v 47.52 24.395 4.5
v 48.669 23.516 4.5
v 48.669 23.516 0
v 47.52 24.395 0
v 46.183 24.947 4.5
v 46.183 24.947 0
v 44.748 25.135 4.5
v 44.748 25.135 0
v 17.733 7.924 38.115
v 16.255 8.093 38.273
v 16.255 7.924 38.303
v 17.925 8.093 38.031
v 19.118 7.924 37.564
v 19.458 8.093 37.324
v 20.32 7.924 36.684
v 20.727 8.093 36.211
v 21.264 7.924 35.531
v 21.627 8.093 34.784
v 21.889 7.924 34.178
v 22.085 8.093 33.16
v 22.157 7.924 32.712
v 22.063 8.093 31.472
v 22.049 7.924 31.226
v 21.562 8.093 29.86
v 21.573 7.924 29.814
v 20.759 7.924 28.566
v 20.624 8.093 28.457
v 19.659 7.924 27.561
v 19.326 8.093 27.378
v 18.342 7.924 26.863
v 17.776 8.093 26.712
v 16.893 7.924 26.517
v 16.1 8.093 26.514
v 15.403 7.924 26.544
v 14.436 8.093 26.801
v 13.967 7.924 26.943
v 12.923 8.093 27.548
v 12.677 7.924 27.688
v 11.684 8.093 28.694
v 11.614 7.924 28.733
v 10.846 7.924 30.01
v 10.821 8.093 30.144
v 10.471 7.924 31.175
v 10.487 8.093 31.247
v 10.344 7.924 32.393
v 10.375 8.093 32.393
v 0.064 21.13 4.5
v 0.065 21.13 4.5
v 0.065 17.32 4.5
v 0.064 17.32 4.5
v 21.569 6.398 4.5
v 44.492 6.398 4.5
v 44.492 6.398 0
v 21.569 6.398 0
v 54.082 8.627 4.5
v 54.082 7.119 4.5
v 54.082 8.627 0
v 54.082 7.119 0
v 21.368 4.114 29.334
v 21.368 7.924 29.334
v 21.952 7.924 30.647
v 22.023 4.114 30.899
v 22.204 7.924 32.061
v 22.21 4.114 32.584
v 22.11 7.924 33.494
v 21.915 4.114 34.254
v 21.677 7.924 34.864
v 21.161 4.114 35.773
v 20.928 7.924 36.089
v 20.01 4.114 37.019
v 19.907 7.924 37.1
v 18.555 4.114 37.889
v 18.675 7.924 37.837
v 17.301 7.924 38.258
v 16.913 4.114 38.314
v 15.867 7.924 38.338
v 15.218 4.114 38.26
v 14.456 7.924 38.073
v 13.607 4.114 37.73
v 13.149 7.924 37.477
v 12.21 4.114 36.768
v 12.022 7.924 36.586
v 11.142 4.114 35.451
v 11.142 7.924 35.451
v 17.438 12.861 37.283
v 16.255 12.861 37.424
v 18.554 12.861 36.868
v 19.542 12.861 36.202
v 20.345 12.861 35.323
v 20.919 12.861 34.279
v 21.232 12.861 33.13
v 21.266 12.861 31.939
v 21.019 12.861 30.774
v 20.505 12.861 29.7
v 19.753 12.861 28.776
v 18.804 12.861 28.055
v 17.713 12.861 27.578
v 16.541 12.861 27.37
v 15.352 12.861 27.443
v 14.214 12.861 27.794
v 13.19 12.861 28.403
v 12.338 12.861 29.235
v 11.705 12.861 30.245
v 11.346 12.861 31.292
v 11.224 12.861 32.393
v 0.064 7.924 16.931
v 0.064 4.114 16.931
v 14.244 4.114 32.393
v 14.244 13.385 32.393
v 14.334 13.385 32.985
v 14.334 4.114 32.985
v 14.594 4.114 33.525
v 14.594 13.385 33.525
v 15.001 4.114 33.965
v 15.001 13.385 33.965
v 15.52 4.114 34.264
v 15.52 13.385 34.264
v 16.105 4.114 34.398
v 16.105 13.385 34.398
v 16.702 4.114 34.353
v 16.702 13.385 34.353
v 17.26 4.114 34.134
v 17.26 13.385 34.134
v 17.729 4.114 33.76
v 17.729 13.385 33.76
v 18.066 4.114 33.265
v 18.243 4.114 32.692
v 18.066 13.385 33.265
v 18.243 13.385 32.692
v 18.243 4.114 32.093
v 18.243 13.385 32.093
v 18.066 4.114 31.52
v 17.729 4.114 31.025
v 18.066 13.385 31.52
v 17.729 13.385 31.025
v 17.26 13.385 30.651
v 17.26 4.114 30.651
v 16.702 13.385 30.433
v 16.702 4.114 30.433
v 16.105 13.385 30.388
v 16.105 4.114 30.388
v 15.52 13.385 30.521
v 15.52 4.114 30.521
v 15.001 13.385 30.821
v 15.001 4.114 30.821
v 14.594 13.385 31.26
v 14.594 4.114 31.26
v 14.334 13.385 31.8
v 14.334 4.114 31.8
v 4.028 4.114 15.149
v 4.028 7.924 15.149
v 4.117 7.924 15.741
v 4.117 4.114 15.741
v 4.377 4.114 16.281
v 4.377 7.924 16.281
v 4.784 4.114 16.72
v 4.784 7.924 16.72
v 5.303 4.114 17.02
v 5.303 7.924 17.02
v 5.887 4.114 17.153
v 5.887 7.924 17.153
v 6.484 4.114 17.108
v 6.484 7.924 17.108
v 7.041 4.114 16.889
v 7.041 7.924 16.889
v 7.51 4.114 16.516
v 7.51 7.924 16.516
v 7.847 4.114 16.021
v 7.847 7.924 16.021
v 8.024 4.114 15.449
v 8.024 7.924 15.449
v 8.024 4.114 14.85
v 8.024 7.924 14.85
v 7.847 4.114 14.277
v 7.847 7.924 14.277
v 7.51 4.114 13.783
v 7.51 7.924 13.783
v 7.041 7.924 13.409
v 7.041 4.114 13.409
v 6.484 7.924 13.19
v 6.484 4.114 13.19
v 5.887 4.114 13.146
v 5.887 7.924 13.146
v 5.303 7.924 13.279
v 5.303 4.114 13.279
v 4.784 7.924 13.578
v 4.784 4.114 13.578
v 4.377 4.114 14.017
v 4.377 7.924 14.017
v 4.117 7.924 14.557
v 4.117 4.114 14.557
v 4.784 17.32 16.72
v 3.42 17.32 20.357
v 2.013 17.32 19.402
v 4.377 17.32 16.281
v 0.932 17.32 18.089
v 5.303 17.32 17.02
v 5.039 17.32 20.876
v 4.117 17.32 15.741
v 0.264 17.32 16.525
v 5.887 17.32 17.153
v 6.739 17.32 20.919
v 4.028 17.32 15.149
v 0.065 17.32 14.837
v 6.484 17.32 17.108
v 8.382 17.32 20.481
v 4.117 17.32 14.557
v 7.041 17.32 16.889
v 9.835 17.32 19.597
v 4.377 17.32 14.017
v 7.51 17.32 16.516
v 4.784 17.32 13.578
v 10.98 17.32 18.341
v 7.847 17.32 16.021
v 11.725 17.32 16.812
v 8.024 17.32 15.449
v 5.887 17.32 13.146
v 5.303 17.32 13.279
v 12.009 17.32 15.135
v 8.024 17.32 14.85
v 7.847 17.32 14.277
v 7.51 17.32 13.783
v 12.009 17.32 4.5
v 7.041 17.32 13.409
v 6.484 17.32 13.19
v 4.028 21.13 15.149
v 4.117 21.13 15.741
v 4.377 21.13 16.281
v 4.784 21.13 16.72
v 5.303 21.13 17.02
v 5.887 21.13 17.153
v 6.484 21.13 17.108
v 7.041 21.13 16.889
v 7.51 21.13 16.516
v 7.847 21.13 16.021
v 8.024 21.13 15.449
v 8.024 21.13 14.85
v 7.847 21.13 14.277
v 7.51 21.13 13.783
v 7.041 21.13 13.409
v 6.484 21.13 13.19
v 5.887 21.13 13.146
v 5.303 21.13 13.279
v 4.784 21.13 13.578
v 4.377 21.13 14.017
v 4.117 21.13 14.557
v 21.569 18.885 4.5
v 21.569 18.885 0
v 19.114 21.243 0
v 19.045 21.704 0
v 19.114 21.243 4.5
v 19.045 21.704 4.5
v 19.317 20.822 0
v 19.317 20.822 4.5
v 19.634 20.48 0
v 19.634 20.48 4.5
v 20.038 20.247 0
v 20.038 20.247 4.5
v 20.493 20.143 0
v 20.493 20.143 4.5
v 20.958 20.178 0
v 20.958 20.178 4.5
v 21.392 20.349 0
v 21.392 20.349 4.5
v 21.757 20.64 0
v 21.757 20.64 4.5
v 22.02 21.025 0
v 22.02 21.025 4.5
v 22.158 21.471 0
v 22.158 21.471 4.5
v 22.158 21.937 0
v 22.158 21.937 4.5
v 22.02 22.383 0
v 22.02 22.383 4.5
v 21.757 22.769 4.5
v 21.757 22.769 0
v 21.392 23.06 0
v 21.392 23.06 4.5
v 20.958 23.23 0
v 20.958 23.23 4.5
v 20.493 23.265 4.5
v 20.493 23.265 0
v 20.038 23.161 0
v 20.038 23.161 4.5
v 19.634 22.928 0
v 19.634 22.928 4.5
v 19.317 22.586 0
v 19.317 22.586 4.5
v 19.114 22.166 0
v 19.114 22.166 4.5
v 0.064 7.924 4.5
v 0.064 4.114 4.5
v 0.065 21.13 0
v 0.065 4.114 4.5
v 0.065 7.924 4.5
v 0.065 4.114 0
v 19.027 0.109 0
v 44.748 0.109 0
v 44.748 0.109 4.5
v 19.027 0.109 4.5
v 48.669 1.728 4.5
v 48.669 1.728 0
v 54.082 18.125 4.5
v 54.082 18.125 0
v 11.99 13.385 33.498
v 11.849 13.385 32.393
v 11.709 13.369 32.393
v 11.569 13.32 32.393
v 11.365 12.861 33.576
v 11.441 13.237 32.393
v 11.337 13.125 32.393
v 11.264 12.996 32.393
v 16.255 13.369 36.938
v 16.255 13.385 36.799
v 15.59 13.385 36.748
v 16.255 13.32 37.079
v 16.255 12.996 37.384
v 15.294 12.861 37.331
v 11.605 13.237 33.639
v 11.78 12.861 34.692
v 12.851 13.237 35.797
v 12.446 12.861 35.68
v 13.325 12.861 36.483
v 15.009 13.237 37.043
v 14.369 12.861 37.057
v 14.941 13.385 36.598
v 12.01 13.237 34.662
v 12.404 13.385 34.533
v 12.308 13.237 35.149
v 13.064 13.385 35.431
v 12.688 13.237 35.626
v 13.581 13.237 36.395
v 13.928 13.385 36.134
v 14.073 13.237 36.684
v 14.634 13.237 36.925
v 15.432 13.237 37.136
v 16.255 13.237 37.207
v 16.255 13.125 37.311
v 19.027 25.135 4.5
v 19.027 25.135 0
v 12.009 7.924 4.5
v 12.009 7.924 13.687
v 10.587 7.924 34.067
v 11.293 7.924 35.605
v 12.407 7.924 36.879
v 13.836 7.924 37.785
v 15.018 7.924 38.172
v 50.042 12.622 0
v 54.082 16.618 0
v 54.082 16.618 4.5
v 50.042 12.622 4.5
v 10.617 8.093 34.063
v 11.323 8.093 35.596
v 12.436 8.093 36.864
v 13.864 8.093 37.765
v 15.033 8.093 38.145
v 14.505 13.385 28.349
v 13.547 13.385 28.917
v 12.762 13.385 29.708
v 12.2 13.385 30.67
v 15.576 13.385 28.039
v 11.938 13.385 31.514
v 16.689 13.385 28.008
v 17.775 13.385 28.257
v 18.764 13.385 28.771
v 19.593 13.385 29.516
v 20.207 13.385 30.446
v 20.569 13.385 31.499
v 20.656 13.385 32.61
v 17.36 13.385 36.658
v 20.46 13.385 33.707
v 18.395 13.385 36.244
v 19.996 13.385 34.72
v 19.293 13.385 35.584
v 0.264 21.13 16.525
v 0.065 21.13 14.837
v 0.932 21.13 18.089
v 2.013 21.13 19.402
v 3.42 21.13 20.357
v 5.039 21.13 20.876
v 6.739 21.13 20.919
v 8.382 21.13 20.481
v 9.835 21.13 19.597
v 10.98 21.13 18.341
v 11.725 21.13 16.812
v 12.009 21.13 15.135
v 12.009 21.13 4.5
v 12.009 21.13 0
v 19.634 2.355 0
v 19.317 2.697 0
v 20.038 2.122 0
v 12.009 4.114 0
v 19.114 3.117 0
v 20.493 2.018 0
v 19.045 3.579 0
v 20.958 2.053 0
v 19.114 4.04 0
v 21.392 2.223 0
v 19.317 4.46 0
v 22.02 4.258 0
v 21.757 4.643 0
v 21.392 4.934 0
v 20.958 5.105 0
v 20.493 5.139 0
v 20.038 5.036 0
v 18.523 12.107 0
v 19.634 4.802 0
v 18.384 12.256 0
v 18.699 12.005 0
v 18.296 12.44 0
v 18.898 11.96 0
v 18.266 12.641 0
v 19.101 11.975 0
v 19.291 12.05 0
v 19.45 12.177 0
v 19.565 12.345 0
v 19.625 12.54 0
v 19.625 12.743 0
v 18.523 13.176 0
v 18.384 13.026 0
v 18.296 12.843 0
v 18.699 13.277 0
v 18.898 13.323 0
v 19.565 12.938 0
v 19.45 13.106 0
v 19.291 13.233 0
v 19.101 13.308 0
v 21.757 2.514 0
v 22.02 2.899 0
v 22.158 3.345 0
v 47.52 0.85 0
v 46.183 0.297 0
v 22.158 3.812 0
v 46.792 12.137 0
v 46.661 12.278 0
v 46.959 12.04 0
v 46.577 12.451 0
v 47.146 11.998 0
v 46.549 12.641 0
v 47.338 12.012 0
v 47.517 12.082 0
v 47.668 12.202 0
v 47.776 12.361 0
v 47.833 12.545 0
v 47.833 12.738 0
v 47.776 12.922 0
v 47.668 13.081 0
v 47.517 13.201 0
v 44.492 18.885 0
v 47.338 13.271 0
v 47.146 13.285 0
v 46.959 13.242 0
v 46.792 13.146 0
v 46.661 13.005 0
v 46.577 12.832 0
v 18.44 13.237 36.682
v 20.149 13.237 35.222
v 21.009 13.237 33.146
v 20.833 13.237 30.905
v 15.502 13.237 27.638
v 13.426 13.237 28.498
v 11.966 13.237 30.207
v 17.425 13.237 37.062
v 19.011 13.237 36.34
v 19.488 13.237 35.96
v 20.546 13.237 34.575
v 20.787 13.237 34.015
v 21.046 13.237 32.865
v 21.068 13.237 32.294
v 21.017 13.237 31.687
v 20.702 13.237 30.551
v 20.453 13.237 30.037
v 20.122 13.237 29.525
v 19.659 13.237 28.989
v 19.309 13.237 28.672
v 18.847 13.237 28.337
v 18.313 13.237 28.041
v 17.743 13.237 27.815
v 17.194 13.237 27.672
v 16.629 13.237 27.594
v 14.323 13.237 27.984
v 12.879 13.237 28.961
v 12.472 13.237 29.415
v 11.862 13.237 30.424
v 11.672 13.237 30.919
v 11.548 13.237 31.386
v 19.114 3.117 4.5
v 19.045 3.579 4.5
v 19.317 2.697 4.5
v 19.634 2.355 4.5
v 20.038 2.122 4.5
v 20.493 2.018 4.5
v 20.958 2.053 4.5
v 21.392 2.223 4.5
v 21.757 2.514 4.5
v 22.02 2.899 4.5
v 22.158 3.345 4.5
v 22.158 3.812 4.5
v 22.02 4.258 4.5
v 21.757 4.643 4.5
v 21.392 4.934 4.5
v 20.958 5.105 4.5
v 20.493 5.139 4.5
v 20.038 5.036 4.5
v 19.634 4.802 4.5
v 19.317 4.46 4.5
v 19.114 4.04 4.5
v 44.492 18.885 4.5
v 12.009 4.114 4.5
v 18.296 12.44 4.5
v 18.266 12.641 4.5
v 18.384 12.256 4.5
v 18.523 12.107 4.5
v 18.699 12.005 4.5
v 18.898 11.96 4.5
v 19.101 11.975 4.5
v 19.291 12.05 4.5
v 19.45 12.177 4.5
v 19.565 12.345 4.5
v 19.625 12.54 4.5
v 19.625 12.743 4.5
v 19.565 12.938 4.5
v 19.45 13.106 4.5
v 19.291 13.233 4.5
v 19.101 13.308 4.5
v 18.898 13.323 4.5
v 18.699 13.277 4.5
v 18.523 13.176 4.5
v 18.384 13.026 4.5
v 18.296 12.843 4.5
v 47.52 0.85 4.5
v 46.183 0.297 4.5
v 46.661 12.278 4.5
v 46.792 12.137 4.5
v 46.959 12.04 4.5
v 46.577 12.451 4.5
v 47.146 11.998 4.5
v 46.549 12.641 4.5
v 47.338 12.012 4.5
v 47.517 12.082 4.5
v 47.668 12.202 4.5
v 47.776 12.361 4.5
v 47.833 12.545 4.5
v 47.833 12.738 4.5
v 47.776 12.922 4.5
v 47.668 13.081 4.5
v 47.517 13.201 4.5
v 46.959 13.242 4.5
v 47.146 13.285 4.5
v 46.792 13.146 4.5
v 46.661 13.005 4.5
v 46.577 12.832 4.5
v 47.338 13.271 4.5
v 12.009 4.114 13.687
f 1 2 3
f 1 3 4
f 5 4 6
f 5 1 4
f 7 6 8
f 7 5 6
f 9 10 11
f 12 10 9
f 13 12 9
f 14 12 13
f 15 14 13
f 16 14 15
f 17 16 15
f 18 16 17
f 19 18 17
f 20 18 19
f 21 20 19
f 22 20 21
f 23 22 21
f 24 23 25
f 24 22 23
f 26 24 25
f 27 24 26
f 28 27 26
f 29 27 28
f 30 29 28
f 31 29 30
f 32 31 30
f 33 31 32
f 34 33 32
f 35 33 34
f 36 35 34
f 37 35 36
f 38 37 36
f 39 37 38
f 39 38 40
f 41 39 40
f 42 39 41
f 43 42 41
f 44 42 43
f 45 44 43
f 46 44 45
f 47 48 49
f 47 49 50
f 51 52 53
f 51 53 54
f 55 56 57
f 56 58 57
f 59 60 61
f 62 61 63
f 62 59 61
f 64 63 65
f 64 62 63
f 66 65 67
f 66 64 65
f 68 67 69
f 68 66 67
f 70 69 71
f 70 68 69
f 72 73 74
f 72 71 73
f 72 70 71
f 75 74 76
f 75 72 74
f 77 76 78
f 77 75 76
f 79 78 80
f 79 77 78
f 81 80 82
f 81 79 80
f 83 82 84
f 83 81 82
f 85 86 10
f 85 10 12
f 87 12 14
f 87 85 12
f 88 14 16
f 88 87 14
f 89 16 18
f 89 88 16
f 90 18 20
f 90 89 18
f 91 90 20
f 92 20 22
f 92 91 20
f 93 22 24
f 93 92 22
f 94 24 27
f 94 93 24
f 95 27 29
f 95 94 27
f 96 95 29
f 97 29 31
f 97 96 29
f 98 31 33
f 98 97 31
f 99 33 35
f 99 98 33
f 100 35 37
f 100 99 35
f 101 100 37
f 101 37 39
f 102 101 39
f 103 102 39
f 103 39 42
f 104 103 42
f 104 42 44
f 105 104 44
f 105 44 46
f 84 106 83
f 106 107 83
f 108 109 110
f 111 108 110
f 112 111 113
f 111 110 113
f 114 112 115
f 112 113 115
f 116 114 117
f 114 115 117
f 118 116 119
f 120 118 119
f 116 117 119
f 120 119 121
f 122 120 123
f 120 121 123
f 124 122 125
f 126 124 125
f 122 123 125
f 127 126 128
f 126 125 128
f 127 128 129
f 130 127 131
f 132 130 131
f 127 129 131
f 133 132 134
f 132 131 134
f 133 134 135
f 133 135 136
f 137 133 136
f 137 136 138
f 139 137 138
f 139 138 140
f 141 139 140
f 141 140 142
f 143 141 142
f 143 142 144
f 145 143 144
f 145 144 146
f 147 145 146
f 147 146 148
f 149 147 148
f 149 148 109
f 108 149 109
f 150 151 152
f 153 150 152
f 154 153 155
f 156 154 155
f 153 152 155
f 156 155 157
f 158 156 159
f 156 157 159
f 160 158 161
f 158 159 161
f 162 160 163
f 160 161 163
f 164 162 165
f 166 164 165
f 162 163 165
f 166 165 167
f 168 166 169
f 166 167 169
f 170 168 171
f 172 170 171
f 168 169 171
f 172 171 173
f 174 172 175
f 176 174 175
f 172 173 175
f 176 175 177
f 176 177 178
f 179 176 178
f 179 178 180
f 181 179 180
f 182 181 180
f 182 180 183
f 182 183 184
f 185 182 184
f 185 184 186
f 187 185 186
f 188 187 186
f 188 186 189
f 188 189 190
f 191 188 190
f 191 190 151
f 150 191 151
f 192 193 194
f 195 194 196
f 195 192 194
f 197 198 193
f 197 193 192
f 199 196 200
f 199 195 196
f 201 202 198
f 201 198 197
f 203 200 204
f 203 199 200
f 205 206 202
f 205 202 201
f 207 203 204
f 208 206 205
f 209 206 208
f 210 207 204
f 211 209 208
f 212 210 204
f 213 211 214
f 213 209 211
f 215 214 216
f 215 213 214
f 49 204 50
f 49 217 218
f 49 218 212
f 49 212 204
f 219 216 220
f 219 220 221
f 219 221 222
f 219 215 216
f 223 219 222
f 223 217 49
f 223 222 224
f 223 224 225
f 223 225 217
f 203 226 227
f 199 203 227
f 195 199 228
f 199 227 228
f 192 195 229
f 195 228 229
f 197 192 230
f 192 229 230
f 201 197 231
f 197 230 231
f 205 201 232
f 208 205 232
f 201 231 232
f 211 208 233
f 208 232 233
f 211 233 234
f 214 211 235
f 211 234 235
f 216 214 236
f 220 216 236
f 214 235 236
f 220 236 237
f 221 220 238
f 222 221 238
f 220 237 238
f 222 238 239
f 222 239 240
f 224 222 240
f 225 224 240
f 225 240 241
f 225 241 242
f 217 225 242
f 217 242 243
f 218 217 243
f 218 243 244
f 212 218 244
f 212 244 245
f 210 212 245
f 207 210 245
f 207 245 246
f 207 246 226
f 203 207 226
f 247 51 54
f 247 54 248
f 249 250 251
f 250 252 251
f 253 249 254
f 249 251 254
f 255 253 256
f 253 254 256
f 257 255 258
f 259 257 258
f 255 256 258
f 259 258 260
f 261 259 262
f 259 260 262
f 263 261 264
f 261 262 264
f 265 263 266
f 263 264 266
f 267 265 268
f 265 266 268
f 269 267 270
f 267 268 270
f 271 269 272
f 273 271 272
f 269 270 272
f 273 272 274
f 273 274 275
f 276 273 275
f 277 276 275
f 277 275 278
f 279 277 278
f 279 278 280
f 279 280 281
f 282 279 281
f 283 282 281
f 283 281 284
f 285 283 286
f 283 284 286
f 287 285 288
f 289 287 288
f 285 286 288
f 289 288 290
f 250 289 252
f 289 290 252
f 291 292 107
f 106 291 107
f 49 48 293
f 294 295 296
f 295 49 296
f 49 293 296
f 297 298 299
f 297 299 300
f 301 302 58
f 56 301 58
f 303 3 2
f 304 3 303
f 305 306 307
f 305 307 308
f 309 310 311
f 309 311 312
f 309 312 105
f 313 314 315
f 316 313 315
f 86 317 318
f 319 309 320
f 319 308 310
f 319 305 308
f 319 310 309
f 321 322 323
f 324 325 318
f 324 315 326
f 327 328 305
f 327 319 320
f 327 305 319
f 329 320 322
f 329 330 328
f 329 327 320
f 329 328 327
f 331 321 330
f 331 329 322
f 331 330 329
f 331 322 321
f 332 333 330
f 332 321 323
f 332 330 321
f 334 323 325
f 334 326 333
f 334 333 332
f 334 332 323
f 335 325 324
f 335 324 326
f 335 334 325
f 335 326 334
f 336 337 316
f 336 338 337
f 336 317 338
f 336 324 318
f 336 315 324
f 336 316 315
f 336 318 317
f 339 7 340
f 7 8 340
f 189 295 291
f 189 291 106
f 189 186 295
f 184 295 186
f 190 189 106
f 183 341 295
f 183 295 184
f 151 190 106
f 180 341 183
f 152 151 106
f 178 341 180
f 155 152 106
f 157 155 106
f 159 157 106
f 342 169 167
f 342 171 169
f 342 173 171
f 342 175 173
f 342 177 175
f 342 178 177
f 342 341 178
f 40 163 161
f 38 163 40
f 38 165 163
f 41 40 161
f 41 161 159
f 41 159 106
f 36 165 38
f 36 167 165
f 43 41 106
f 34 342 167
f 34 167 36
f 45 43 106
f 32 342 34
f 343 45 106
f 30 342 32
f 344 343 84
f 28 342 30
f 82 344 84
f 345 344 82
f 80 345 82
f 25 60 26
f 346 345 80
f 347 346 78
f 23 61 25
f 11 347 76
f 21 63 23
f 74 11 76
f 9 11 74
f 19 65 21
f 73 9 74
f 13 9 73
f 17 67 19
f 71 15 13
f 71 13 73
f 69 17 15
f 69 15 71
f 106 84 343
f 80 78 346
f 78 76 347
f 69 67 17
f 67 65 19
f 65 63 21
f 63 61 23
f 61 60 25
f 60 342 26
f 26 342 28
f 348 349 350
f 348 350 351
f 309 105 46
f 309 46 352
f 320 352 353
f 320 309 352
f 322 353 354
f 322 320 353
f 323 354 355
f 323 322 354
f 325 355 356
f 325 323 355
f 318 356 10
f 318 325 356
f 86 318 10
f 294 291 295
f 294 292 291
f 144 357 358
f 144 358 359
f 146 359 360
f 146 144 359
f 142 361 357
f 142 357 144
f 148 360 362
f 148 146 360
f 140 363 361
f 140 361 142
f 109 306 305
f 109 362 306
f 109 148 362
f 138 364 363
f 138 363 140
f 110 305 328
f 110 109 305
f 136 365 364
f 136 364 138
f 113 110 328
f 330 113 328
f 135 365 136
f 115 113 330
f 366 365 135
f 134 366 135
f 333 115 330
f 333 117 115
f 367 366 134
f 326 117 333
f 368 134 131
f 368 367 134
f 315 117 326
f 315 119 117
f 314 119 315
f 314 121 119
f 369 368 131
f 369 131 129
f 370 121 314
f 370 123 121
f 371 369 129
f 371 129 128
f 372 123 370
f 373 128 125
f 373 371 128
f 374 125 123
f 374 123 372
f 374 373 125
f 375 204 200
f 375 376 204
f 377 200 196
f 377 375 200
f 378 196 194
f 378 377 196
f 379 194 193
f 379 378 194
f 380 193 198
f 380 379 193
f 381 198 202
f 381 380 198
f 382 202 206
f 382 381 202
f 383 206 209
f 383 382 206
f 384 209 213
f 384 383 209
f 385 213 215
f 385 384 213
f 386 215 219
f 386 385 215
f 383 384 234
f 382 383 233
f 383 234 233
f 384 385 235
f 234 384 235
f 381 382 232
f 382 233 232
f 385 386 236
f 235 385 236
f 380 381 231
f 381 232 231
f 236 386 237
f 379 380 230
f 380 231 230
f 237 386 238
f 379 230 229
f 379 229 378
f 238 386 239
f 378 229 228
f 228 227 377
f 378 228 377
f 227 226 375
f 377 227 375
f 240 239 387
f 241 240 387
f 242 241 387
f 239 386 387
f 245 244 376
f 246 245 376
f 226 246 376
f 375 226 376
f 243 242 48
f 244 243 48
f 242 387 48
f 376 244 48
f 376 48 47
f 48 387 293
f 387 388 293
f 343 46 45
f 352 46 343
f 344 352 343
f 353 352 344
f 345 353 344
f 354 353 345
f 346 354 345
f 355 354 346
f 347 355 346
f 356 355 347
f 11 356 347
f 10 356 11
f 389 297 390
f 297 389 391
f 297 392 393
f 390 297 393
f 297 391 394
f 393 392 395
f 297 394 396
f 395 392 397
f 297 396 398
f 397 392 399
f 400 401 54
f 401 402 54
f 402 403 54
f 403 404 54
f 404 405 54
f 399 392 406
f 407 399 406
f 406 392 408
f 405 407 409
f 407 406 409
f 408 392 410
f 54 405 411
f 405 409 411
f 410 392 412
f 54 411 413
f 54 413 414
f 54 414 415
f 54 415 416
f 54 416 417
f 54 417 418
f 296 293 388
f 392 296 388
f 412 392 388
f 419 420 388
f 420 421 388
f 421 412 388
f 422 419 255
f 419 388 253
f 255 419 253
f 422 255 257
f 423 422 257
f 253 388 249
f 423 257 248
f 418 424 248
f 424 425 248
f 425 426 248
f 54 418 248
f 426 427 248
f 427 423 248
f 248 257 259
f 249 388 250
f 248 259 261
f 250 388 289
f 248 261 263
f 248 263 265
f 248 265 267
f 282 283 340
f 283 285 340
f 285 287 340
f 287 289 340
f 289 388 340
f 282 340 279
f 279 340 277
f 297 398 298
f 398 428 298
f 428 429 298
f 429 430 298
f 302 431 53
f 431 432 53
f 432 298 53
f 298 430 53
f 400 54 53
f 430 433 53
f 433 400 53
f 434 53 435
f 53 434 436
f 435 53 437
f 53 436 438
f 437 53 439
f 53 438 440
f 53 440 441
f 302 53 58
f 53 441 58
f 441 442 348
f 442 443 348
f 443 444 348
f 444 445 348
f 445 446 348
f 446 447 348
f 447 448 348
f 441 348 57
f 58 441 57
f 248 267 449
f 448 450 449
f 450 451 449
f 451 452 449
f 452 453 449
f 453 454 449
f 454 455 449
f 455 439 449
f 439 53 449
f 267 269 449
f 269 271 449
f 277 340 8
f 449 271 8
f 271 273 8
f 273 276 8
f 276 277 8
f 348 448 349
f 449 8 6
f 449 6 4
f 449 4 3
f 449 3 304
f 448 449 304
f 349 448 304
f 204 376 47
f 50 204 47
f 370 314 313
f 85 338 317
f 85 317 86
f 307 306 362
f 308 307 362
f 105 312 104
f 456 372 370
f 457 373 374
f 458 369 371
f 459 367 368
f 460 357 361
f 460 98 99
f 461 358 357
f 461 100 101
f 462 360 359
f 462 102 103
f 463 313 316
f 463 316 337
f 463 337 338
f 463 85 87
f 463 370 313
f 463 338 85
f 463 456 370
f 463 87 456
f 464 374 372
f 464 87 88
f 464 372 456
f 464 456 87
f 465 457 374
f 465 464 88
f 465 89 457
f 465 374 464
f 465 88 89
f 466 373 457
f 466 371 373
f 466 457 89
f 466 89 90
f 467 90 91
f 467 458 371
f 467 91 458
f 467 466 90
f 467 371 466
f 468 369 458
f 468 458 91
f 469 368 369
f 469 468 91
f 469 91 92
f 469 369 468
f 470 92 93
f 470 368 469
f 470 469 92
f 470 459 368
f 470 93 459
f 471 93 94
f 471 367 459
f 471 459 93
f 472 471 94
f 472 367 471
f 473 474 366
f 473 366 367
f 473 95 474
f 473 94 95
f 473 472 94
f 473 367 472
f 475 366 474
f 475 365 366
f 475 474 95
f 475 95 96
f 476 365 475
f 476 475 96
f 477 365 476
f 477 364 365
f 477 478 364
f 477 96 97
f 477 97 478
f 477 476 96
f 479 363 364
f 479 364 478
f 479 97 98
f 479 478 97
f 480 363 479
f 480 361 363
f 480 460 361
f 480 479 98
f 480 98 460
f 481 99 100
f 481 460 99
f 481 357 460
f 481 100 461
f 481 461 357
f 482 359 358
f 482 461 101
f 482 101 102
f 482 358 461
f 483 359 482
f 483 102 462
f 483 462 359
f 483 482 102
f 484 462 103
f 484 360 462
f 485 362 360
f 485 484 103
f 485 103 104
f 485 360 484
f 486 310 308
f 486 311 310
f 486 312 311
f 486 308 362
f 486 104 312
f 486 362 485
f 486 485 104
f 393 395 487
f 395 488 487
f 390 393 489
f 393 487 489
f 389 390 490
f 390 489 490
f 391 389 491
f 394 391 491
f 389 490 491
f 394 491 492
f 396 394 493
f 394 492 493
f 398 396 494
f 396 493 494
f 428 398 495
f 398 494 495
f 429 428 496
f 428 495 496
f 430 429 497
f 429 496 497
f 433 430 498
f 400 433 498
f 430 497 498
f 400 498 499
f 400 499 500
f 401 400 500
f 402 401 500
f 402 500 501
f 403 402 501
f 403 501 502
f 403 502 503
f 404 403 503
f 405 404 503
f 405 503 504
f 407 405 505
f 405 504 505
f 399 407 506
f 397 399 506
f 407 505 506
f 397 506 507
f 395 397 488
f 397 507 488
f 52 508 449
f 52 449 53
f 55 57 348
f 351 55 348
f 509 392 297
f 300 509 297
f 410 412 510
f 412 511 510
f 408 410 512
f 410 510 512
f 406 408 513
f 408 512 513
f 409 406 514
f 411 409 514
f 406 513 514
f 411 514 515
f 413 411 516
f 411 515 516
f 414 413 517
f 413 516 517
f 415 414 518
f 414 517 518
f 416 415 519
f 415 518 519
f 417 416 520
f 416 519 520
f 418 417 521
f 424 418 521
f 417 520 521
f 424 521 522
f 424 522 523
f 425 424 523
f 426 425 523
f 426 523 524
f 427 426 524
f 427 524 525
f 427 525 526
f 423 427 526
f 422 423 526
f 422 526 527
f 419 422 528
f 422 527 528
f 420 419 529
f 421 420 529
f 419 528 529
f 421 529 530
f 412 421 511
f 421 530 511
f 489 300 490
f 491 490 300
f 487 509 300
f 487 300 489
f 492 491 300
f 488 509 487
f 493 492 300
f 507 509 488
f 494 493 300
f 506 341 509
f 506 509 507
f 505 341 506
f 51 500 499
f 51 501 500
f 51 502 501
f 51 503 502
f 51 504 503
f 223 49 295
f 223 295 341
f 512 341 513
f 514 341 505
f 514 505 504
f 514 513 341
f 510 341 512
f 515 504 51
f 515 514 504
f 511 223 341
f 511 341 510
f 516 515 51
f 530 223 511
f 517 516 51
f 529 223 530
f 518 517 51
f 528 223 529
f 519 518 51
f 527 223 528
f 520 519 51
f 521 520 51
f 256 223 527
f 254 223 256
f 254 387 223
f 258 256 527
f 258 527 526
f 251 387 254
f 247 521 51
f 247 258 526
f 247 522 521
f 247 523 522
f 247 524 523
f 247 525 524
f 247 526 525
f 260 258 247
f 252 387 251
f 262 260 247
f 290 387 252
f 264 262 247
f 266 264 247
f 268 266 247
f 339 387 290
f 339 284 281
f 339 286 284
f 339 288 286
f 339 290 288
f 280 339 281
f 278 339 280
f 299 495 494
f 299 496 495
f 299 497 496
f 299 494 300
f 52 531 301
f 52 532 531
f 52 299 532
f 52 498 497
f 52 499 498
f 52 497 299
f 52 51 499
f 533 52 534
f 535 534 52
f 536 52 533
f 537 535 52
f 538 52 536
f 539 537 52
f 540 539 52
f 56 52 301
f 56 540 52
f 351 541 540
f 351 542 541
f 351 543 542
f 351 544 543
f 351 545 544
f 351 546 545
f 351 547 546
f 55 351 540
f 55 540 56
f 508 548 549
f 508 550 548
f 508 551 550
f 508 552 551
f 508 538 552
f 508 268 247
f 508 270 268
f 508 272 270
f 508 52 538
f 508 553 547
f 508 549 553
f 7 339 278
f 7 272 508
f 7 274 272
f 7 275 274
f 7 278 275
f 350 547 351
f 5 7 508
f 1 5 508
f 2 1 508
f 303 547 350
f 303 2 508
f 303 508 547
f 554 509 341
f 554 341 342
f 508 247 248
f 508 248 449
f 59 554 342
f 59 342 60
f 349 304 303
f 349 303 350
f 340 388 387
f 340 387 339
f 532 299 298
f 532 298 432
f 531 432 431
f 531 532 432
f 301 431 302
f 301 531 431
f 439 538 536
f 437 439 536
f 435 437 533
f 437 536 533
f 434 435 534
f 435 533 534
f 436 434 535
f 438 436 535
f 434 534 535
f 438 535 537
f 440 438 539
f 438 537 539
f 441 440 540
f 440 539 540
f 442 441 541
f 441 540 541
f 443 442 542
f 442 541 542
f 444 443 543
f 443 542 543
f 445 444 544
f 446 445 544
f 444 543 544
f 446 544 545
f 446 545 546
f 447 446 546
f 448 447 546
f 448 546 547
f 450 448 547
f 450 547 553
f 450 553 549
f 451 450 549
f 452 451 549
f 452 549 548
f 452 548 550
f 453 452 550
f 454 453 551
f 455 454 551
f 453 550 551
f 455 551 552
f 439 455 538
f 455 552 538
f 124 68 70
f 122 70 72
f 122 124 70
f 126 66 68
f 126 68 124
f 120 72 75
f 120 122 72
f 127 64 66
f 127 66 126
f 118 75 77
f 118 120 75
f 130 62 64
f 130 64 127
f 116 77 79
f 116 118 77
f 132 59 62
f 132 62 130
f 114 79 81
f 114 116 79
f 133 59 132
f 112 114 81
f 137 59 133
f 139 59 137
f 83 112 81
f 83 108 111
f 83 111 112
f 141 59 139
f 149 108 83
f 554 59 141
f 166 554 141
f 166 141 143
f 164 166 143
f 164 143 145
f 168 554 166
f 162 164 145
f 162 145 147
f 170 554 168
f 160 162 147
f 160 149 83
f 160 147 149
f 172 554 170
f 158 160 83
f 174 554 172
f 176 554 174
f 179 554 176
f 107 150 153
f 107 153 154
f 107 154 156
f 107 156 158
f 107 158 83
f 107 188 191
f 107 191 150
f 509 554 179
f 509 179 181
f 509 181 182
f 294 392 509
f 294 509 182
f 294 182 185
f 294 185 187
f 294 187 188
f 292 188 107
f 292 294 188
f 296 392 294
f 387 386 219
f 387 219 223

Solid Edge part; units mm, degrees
sketch "Sketch1" plane through (0, 0, 0) normal (0, 0, -1) x (-1, 0, 0)
  line L0 (-47.0429, 25.1351) -> (-19.0272, 25.1351)
  line L1 (-12.0091, 21.1302) -> (-19.0272, 25.1351)
  line L2 (-12.0091, 21.1302) -> (-0.0646, 21.1302)
  line L3 (-0.0646, 21.1302) -> (-0.0646, 12.6221)
  line L4 (-0.0646, 4.114) -> (-0.0646, 12.6221)
  line L5 (-12.0091, 4.114) -> (-0.0646, 4.114)
  line L6 (-12.0091, 4.114) -> (-19.0272, 0.1091)
  line L7 (-47.0429, 0.1091) -> (-19.0272, 0.1091)
  line L8 (-47.0429, 0.1091) -> (-54.082, 7.1192)
  line L9 (-54.082, 7.1192) -> (-54.082, 8.6266)
  line L10 (-54.082, 8.6266) -> (-50.0417, 12.6221)
  line L11 (-54.082, 16.6176) -> (-50.0417, 12.6221)
  line L12 (-54.082, 18.1251) -> (-54.082, 16.6176)
  line L13 (-47.0429, 25.1351) -> (-54.082, 18.1251)
extrude "Protrusion1" add sketch "Sketch1" against normal blind 4.5
sketch "Sketch2" plane through (6.0368, 4.114, 2.25) normal (0, -1, 0) x (1, 0, 0)
  line L0 (-5.9723, 2.25) -> (-5.9723, 14.6813)
  line L1 (-5.9723, 14.6813) -> (5.1048, 33.2011)
  arc A0 (5.1048, 33.2011) -> (15.3315, 27.0843) centre (10.2182, 30.1427) cw
  line L2 (5.9723, 11.4366) -> (15.3315, 27.0843)
  line L3 (5.9723, 2.25) -> (5.9723, 11.4366)
  line L4 (-5.9723, 2.25) -> (5.9723, 2.25)
extrude "Ajout_matière_2" add sketch "Sketch2" against normal blind 3.81
sketch "Sketch3" plane through (6.0368, 21.1302, 2.25) normal (0, 1, 0) x (-1, 0, 0)
  line L0 (5.9723, 12.5868) -> (5.9723, 2.25)
  line L1 (-5.9723, 2.25) -> (5.9723, 2.25)
  line L2 (-5.9723, 12.8853) -> (-5.9723, 2.25)
  arc A0 (5.9723, 12.5868) -> (-5.9723, 12.8853) centre (0, 12.7361) ccw
extrude "Ajout_matière_3" add sketch "Sketch3" against normal blind 3.81
sketch "Sketch4" plane through (6.0368, 21.1302, 2.25) normal (0, 1, 0) x (-1, 0, 0)
  circle A0 centre (0, 12.8992) radius 2.0092
extrude "Cutout1" cut sketch "Sketch4" against normal through all
sketch "Sketch5" plane through (11.1416, 7.924, 35.4511) normal (-0.513309, 0, -0.8582039) x (0, -1, 0)
  line L0 (-0.1674, -5.9582) -> (-5.3937, -5.9582)
  line L1 (-0.1674, -5.9582) -> (0, -5.9582)
sketch "Sketch6" plane through (16.255, 7.924, 32.3927) normal (0, 1, 0) x (-1, 0, 0)
  circle A0 centre (0, 0) radius 5.9106
sketch "Sketch7" plane through (11.1389, 13.385, 21.4255) normal (0, 1, 0) x (0, 0, 1)
  circle A0 centre (10.9673, 5.1161) radius 4.9379
sweep "Ajout_matière_par_balayage_4" add profiles "Sketch6", "Sketch7" path "Sketch5"
sketch "Sketch8" plane through (16.255, 13.385, 32.3927) normal (0, 1, 0) x (-1, 0, 0)
  circle A0 centre (0, 0) radius 2.0106
extrude "Cutout2" cut sketch "Sketch8" against normal through all
sketch "Sketch9" plane through (27.0733, 12.6221, 4.5) normal (0, 0, 1) x (-1, 0, 0)
  circle A0 centre (8.1244, -0.0193) radius 0.6833
  circle A1 centre (-20.1211, -0.0193) radius 0.6456
  circle A2 centre (6.4635, 9.0435) radius 1.5652
  circle A3 centre (6.4635, -9.0821) radius 1.5652
  line L0 (-17.4191, 6.2241) -> (5.5043, 6.2241)
  line L1 (5.5043, 6.2241) -> (5.5043, -6.2627)
  line L2 (5.5043, -6.2627) -> (-17.4191, -6.2627)
  line L3 (-17.4191, -6.2627) -> (-17.4191, 6.2241)
  dimension "D1" = 2.8194
  dimension "D2" = 2.8194
extrude "Cutout3" cut sketch "Sketch9" against normal through all
fillet "Congé_2" radius 5.5563 2 edges at (47.0429, 25.1351, 2.25) (47.0429, 0.1091, 2.25)
fillet "Congé_3" radius 0.635 1 edges at (21.1929, 13.385, 32.3927)
properties part number "AC_1.09"
